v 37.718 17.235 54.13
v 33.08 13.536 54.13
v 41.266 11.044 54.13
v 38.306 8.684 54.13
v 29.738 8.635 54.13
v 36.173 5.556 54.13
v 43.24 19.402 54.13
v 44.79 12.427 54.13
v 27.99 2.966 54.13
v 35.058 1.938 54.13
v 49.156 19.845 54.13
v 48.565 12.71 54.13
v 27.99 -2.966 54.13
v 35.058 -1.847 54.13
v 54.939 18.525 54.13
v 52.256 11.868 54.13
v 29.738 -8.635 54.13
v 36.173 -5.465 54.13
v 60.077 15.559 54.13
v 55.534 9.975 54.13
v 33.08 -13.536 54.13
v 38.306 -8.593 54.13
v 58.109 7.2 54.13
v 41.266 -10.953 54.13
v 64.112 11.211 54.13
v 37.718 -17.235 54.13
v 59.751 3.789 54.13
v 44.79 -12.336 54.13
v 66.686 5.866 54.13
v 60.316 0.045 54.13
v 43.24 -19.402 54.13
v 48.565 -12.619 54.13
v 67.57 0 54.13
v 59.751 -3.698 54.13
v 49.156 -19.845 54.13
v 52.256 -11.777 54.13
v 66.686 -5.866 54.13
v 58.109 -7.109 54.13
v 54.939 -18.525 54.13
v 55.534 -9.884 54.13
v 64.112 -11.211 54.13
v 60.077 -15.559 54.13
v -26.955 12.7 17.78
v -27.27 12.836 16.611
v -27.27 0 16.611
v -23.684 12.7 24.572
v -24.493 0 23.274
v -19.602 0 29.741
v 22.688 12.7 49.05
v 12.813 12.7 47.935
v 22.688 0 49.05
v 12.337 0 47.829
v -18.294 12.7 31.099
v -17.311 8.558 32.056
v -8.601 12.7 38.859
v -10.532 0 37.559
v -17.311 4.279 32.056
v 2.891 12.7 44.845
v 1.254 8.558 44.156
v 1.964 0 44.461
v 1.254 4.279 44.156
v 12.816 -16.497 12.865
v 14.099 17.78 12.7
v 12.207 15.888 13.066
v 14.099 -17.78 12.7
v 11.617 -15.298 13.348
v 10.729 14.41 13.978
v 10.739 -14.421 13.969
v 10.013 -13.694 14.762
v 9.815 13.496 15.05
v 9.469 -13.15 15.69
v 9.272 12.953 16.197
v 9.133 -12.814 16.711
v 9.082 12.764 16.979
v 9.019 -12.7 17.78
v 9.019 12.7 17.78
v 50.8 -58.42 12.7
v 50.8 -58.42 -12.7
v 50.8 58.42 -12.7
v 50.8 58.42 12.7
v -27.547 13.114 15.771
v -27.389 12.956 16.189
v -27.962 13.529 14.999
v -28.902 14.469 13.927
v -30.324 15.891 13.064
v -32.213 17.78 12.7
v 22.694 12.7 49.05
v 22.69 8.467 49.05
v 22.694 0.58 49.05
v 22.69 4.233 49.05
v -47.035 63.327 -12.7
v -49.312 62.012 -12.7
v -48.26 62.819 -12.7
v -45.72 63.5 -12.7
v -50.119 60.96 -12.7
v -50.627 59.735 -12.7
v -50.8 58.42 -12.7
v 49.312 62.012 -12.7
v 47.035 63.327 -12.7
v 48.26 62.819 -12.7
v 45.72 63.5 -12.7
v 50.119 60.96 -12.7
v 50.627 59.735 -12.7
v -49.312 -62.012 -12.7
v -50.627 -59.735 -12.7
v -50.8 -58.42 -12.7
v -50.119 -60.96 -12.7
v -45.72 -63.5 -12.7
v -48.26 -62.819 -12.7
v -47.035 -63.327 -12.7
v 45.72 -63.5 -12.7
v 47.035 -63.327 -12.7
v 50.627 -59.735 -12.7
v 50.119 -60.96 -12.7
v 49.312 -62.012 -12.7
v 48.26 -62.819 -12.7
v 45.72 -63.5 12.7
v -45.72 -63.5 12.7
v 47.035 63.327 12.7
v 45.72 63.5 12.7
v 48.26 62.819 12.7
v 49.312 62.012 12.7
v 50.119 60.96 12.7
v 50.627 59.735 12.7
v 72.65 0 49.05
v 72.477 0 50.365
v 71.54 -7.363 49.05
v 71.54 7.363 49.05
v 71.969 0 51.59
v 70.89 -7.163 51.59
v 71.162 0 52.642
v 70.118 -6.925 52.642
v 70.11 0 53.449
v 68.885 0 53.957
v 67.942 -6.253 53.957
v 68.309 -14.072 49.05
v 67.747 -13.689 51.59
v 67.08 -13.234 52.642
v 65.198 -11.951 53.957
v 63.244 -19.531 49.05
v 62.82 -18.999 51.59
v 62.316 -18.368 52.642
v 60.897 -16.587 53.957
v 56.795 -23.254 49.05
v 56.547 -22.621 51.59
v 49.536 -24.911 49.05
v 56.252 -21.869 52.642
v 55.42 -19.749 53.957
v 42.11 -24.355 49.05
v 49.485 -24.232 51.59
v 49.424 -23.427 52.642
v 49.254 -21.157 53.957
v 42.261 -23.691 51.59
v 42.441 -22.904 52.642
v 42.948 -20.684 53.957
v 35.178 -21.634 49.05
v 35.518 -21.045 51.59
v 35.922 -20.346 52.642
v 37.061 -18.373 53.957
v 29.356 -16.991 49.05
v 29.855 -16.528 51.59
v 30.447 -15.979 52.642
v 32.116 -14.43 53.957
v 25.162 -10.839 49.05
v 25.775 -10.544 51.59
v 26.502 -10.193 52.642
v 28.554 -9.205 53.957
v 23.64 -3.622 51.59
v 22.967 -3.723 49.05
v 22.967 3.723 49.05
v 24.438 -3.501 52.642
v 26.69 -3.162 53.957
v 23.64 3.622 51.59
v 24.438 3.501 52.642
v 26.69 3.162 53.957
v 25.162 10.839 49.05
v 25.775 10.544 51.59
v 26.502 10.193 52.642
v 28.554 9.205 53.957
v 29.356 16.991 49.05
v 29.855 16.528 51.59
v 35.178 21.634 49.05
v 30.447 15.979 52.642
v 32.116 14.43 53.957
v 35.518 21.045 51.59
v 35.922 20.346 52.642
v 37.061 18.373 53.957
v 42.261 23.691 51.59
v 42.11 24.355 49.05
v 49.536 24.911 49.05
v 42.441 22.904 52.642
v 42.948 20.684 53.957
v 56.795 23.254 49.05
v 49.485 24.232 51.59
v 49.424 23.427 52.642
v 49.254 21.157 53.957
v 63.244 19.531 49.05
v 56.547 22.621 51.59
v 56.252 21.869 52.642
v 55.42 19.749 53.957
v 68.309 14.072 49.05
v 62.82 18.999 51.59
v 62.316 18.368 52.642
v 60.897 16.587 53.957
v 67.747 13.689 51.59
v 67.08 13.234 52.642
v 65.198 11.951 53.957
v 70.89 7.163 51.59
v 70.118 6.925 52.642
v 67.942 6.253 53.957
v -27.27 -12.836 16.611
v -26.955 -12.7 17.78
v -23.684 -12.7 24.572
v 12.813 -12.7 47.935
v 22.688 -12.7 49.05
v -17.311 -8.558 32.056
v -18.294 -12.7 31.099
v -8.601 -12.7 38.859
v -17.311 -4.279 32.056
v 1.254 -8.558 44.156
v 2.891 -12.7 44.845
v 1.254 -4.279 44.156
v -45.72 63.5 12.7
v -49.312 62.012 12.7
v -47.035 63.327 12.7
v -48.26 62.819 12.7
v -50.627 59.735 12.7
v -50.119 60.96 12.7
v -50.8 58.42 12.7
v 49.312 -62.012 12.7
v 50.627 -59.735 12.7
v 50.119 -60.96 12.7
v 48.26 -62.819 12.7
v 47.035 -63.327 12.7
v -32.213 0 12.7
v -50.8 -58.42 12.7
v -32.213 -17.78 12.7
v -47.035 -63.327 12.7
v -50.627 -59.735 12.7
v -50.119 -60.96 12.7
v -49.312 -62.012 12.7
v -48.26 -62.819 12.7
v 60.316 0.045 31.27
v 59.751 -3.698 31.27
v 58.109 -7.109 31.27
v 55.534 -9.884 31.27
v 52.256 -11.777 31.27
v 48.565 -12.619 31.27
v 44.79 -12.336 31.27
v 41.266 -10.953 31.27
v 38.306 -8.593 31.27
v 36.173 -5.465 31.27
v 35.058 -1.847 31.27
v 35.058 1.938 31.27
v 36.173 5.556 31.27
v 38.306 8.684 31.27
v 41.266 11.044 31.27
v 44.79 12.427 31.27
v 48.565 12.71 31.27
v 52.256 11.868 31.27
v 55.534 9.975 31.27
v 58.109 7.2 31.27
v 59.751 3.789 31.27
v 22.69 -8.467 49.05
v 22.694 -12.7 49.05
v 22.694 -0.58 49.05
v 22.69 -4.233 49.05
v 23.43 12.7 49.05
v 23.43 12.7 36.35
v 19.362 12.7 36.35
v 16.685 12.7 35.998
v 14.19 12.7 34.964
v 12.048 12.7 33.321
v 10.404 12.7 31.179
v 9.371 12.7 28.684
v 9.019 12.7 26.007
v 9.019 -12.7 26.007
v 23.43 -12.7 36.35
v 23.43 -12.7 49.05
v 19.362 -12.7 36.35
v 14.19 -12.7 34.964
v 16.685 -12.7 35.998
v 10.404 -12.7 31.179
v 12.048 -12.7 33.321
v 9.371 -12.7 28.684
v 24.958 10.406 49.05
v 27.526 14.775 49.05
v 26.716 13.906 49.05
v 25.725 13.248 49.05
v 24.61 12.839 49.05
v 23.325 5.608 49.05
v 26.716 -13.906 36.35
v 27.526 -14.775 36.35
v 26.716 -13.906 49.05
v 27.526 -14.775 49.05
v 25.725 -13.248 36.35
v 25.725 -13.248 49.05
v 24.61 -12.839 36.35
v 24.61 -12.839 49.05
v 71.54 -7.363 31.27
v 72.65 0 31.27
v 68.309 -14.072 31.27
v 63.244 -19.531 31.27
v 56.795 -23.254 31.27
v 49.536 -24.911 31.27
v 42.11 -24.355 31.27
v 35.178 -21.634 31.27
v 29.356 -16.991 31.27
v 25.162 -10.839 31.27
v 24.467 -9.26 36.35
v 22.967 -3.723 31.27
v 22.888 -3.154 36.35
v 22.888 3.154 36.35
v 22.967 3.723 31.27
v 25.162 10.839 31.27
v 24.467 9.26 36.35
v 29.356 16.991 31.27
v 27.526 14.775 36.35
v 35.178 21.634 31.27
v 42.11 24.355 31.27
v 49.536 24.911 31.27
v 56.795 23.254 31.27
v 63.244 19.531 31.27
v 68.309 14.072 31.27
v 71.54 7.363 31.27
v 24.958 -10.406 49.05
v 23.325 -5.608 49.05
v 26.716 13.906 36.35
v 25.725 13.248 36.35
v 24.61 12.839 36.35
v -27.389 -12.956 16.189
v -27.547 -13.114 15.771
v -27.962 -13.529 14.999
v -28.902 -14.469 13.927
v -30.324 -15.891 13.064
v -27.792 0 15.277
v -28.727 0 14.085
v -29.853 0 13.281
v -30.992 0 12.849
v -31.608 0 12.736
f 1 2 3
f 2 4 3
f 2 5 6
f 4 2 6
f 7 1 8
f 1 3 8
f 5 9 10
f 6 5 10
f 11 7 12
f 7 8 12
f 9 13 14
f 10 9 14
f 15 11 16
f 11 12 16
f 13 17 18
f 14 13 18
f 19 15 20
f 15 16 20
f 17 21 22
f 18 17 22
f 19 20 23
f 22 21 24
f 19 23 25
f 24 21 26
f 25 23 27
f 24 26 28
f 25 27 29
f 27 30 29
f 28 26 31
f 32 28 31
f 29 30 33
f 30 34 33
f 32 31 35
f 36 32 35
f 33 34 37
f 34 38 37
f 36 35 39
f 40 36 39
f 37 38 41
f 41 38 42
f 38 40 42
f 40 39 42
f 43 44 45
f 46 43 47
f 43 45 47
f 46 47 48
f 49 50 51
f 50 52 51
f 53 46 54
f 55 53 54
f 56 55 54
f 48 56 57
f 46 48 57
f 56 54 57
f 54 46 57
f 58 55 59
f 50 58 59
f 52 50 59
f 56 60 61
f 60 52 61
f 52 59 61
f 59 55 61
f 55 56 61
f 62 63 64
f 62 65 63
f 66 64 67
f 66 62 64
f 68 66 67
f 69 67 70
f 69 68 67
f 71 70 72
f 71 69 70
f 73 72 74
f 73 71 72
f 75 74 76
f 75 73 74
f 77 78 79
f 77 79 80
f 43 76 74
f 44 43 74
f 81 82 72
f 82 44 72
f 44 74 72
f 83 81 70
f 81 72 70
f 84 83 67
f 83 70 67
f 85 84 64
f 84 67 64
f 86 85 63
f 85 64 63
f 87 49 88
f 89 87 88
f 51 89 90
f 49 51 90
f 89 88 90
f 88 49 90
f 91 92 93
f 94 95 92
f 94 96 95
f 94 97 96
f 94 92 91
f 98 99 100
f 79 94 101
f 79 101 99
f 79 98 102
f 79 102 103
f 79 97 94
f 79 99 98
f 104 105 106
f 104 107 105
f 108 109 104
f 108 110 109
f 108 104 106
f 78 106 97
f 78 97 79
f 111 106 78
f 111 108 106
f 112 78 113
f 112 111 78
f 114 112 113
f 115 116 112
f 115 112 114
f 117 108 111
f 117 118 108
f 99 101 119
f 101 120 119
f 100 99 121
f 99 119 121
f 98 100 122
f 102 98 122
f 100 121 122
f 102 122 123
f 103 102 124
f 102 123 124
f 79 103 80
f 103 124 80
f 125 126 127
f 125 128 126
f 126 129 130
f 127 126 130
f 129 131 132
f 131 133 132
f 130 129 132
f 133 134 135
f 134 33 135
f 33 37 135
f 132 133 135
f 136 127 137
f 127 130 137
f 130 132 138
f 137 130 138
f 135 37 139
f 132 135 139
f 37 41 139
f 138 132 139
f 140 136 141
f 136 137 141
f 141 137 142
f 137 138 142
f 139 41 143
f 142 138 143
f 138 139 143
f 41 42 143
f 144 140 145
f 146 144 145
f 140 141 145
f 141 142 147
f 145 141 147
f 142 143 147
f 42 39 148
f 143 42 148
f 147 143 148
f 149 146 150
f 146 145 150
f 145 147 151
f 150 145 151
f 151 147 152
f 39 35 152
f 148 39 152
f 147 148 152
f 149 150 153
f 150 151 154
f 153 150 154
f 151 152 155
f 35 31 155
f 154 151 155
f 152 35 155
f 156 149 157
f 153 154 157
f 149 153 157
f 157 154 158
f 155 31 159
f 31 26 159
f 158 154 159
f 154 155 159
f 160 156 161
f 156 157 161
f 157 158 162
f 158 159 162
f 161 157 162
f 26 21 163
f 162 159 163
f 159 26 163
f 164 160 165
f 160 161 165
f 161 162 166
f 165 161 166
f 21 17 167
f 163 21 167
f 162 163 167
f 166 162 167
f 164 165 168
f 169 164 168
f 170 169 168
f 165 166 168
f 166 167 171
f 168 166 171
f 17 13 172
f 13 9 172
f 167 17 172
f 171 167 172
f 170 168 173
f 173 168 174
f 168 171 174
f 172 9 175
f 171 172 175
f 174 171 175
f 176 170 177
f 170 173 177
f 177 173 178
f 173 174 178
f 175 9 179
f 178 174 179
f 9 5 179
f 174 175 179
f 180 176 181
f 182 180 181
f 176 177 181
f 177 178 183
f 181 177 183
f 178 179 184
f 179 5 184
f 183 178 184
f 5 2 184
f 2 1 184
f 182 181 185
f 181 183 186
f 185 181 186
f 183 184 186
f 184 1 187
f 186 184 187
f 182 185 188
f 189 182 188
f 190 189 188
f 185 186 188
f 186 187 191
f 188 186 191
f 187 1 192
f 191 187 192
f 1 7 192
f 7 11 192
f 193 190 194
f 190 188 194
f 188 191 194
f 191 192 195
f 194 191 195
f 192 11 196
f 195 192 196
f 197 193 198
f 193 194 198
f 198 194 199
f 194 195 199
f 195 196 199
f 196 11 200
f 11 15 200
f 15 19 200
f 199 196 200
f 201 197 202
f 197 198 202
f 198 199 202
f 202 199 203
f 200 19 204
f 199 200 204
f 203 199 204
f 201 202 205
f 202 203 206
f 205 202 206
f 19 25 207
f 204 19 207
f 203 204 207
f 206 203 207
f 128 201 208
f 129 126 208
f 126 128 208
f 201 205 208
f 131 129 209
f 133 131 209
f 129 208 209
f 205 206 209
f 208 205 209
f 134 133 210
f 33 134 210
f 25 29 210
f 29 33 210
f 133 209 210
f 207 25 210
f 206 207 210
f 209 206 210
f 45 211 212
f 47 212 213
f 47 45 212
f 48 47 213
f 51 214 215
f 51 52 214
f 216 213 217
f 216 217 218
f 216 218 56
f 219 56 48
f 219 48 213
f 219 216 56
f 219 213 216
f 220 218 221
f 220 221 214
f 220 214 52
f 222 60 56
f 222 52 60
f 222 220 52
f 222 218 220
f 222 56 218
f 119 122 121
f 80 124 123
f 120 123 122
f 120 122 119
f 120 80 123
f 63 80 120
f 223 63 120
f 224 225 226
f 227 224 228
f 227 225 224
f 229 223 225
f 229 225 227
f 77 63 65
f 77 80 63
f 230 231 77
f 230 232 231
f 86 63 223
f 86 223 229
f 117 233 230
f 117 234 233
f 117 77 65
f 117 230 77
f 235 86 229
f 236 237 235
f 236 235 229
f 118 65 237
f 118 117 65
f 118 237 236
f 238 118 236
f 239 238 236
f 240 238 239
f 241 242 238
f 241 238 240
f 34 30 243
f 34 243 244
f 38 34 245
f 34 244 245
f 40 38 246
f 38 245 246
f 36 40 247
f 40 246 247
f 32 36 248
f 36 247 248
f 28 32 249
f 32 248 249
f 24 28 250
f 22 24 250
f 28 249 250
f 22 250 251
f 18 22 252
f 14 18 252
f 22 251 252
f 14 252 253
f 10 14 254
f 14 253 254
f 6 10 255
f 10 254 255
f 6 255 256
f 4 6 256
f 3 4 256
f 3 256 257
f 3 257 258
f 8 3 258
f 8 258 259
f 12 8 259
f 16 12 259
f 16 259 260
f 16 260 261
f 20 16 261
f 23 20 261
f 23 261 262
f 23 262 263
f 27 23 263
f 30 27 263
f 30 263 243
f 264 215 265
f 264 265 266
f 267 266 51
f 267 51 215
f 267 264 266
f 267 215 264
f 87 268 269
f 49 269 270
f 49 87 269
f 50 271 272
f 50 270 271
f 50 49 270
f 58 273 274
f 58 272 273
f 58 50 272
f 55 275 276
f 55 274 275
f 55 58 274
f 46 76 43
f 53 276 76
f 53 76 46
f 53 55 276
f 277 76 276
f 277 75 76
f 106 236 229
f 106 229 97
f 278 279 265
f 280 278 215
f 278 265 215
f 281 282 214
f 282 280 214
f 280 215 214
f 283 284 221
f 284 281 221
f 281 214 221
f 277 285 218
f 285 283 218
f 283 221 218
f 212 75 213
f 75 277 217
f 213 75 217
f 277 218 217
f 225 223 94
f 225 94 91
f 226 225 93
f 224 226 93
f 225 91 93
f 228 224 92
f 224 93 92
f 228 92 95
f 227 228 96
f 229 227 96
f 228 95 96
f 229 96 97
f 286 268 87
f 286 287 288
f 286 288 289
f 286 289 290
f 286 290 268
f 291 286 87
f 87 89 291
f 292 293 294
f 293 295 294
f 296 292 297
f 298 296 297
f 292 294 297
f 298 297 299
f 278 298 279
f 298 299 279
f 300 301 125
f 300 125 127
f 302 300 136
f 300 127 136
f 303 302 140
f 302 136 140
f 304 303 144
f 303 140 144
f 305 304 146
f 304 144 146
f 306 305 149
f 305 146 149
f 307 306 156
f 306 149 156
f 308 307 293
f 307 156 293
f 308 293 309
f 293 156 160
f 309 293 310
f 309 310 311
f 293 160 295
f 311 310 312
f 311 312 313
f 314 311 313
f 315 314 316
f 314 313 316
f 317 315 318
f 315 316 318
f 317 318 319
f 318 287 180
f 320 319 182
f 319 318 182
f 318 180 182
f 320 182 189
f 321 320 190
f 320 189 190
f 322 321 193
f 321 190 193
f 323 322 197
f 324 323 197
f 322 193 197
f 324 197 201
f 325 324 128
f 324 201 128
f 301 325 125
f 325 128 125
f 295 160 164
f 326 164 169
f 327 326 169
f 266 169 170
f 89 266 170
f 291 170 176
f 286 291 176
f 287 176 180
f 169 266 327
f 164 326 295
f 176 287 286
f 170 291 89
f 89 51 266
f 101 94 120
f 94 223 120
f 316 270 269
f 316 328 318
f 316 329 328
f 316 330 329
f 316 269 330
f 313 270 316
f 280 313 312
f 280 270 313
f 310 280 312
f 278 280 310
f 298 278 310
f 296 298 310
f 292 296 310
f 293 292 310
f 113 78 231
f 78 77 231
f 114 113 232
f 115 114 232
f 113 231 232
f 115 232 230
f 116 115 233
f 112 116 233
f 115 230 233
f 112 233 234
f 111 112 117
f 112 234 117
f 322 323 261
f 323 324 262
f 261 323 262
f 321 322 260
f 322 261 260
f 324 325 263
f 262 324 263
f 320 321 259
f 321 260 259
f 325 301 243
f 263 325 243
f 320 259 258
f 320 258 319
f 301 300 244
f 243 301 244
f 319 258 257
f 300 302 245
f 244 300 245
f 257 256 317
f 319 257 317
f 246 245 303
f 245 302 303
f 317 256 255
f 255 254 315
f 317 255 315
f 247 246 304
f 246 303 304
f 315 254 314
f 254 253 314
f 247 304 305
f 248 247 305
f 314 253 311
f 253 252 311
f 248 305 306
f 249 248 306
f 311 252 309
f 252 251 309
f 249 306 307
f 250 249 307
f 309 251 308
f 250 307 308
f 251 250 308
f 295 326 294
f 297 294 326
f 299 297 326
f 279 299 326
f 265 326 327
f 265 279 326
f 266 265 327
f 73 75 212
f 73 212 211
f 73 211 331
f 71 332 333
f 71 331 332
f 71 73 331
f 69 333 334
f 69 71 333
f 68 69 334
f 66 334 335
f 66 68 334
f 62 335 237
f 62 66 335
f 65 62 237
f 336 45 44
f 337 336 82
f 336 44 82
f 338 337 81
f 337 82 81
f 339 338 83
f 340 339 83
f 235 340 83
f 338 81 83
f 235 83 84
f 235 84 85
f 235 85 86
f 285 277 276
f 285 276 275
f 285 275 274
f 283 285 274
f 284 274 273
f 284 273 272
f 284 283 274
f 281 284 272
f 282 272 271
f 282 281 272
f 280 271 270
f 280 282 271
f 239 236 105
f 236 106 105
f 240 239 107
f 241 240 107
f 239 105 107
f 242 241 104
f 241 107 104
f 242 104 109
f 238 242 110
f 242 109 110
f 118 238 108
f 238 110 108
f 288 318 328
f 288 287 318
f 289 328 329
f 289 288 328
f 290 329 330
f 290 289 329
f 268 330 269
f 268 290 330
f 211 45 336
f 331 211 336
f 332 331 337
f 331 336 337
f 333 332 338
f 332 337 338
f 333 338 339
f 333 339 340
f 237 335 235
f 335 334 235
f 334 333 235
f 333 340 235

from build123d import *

# Parameters (mm, degrees)
F1_DEPTH  = 63.5
F2_DEPTH  = 63.5
F3_DEPTH  = 12.7
F5_R      = 5.08
F6_R      = 5.08
F7_R      = 5.07999
F10_D     = 25.4
F10_DEPTH = 22.8609980474


# Not quite as in the source:
# - a fillet or chamfer is up to 0.001 mm smaller than in the source, because OpenCascade refuses the exact size


with BuildPart() as f1:
    # F0 (on Front) → F1 (new body, symmetric)
    with BuildSketch(Plane.XZ):
        Polygon((-27.7423580625, 12.7), (-50.8, 12.7), (-50.8, -12.7), (50.8, -12.7), (50.8, 12.7), (9.0188104659, 12.7), align=None)
    extrude(amount=F1_DEPTH, both=True)

    # F0 (on Front) → F2 (join, symmetric)
    with BuildSketch(Plane.XZ):
        Polygon((-27.7423580625, 12.7), (-50.8, 12.7), (-50.8, -12.7), (50.8, -12.7), (50.8, 12.7), (9.0188104659, 12.7), align=None)
    extrude(amount=F2_DEPTH, both=True)

    # F0 (on Front) → F3 (join, symmetric)
    with BuildSketch(Plane.XZ):
        with BuildLine():
            add(Edge.make_bspline(
                [(-27.7423580625, 12.7), (-27.7423580625, 29.5749301373), (-0.0054883666, 49.0460789908), (22.6876754314, 49.0499310609)],
                knots=[0, 0, 0, 0, 62.1644632252, 62.1644632252, 62.1644632252, 62.1644632252], degree=3))
            Line((-27.7423580625, 12.7), (9.0188104659, 12.7))
            Line((9.0188104659, 12.7), (9.0188104659, 26.0071345331))
            ThreePointArc((9.0188104659, 26.0071345331), (12.0481455999, 33.3205964986), (19.3616075654, 36.3499316326))
            Line((19.3616075654, 36.3499316326), (22.6876754314, 36.3499316326))
            Line((22.6876754314, 36.3499316326), (22.6876754314, 49.0499310609))
        make_face()
        with BuildLine():
            add(Edge.make_bspline(
                [(22.6876754314, 49.0499310609), (22.689920498, 49.049931442), (22.6921655153, 49.0499316326), (22.6944104832, 49.0499316326)],
                knots=[62.1644632252, 62.1644632252, 62.1644632252, 62.1644632252, 62.1706132431, 62.1706132431, 62.1706132431, 62.1706132431], degree=3))
            Line((22.6876754314, 49.0499310609), (22.6876754314, 36.3499316326))
            Line((22.6876754314, 36.3499316326), (47.668707557, 36.3499316326))
            Line((47.668707557, 36.3499316326), (47.668707557, 49.0499316326))
            Line((47.668707557, 49.0499316326), (22.6944104832, 49.0499316326))
        make_face()
    extrude(amount=F3_DEPTH, both=True)

    # F0 (on Front) → F4 (revolve)
    with BuildSketch(Plane.XZ):
        Polygon((72.6497396827, 54.1299306562), (47.668707557, 54.1299306562), (47.668707557, 49.0499316326), (47.668707557, 36.3499316326), (47.668707557, 31.2699326089), (72.6497396827, 31.2699326089), align=None)
    revolve(axis=Axis((47.668707557, 0, 42.6999316326), (0, 0, -1)))

    # F5
    f5_edges = [f1.edges().sort_by_distance(p)[0] for p in [
        (-9.361774, -12.7, 12.7),
        (9.01881, 0, 12.7),
        (-27.742358, 6.35, 12.7),
        (-27.742358, -6.35, 12.7),
        (-9.361774, 12.7, 12.7),
        (-50.8, -63.5, 0),
        (-50.8, 63.5, 0),
        (50.8, -63.5, 0),
        (50.8, 63.5, 0),
    ]]
    fillet(f5_edges, radius=F5_R)

    # F6
    f6_edges = [f1.edges().sort_by_distance(p)[0] for p in [
        (26.156805, -12.7, 42.699932),
        (26.156805, 12.7, 42.699932),
    ]]
    fillet(f6_edges, radius=F6_R)

    # F7 (radius 5.08 in the source; OpenCascade refuses exactly that, so slightly less here)
    f7_edges = [f1.edges().sort_by_distance(p)[0] for p in [
        (22.687675, 0, 54.129931),
    ]]
    fillet(f7_edges, radius=F7_R)

    # F10 (through all, one way)
    with BuildSketch(Plane(origin=(0, 0, 31.2699326089), x_dir=(1, 0, 0), z_dir=(0, 0, -1))):
        with Locations((47.61569947, -0.0454496221)):
            Circle(F10_D / 2)
    extrude(amount=-F10_DEPTH, mode=Mode.SUBTRACT)


solid = f1.part
